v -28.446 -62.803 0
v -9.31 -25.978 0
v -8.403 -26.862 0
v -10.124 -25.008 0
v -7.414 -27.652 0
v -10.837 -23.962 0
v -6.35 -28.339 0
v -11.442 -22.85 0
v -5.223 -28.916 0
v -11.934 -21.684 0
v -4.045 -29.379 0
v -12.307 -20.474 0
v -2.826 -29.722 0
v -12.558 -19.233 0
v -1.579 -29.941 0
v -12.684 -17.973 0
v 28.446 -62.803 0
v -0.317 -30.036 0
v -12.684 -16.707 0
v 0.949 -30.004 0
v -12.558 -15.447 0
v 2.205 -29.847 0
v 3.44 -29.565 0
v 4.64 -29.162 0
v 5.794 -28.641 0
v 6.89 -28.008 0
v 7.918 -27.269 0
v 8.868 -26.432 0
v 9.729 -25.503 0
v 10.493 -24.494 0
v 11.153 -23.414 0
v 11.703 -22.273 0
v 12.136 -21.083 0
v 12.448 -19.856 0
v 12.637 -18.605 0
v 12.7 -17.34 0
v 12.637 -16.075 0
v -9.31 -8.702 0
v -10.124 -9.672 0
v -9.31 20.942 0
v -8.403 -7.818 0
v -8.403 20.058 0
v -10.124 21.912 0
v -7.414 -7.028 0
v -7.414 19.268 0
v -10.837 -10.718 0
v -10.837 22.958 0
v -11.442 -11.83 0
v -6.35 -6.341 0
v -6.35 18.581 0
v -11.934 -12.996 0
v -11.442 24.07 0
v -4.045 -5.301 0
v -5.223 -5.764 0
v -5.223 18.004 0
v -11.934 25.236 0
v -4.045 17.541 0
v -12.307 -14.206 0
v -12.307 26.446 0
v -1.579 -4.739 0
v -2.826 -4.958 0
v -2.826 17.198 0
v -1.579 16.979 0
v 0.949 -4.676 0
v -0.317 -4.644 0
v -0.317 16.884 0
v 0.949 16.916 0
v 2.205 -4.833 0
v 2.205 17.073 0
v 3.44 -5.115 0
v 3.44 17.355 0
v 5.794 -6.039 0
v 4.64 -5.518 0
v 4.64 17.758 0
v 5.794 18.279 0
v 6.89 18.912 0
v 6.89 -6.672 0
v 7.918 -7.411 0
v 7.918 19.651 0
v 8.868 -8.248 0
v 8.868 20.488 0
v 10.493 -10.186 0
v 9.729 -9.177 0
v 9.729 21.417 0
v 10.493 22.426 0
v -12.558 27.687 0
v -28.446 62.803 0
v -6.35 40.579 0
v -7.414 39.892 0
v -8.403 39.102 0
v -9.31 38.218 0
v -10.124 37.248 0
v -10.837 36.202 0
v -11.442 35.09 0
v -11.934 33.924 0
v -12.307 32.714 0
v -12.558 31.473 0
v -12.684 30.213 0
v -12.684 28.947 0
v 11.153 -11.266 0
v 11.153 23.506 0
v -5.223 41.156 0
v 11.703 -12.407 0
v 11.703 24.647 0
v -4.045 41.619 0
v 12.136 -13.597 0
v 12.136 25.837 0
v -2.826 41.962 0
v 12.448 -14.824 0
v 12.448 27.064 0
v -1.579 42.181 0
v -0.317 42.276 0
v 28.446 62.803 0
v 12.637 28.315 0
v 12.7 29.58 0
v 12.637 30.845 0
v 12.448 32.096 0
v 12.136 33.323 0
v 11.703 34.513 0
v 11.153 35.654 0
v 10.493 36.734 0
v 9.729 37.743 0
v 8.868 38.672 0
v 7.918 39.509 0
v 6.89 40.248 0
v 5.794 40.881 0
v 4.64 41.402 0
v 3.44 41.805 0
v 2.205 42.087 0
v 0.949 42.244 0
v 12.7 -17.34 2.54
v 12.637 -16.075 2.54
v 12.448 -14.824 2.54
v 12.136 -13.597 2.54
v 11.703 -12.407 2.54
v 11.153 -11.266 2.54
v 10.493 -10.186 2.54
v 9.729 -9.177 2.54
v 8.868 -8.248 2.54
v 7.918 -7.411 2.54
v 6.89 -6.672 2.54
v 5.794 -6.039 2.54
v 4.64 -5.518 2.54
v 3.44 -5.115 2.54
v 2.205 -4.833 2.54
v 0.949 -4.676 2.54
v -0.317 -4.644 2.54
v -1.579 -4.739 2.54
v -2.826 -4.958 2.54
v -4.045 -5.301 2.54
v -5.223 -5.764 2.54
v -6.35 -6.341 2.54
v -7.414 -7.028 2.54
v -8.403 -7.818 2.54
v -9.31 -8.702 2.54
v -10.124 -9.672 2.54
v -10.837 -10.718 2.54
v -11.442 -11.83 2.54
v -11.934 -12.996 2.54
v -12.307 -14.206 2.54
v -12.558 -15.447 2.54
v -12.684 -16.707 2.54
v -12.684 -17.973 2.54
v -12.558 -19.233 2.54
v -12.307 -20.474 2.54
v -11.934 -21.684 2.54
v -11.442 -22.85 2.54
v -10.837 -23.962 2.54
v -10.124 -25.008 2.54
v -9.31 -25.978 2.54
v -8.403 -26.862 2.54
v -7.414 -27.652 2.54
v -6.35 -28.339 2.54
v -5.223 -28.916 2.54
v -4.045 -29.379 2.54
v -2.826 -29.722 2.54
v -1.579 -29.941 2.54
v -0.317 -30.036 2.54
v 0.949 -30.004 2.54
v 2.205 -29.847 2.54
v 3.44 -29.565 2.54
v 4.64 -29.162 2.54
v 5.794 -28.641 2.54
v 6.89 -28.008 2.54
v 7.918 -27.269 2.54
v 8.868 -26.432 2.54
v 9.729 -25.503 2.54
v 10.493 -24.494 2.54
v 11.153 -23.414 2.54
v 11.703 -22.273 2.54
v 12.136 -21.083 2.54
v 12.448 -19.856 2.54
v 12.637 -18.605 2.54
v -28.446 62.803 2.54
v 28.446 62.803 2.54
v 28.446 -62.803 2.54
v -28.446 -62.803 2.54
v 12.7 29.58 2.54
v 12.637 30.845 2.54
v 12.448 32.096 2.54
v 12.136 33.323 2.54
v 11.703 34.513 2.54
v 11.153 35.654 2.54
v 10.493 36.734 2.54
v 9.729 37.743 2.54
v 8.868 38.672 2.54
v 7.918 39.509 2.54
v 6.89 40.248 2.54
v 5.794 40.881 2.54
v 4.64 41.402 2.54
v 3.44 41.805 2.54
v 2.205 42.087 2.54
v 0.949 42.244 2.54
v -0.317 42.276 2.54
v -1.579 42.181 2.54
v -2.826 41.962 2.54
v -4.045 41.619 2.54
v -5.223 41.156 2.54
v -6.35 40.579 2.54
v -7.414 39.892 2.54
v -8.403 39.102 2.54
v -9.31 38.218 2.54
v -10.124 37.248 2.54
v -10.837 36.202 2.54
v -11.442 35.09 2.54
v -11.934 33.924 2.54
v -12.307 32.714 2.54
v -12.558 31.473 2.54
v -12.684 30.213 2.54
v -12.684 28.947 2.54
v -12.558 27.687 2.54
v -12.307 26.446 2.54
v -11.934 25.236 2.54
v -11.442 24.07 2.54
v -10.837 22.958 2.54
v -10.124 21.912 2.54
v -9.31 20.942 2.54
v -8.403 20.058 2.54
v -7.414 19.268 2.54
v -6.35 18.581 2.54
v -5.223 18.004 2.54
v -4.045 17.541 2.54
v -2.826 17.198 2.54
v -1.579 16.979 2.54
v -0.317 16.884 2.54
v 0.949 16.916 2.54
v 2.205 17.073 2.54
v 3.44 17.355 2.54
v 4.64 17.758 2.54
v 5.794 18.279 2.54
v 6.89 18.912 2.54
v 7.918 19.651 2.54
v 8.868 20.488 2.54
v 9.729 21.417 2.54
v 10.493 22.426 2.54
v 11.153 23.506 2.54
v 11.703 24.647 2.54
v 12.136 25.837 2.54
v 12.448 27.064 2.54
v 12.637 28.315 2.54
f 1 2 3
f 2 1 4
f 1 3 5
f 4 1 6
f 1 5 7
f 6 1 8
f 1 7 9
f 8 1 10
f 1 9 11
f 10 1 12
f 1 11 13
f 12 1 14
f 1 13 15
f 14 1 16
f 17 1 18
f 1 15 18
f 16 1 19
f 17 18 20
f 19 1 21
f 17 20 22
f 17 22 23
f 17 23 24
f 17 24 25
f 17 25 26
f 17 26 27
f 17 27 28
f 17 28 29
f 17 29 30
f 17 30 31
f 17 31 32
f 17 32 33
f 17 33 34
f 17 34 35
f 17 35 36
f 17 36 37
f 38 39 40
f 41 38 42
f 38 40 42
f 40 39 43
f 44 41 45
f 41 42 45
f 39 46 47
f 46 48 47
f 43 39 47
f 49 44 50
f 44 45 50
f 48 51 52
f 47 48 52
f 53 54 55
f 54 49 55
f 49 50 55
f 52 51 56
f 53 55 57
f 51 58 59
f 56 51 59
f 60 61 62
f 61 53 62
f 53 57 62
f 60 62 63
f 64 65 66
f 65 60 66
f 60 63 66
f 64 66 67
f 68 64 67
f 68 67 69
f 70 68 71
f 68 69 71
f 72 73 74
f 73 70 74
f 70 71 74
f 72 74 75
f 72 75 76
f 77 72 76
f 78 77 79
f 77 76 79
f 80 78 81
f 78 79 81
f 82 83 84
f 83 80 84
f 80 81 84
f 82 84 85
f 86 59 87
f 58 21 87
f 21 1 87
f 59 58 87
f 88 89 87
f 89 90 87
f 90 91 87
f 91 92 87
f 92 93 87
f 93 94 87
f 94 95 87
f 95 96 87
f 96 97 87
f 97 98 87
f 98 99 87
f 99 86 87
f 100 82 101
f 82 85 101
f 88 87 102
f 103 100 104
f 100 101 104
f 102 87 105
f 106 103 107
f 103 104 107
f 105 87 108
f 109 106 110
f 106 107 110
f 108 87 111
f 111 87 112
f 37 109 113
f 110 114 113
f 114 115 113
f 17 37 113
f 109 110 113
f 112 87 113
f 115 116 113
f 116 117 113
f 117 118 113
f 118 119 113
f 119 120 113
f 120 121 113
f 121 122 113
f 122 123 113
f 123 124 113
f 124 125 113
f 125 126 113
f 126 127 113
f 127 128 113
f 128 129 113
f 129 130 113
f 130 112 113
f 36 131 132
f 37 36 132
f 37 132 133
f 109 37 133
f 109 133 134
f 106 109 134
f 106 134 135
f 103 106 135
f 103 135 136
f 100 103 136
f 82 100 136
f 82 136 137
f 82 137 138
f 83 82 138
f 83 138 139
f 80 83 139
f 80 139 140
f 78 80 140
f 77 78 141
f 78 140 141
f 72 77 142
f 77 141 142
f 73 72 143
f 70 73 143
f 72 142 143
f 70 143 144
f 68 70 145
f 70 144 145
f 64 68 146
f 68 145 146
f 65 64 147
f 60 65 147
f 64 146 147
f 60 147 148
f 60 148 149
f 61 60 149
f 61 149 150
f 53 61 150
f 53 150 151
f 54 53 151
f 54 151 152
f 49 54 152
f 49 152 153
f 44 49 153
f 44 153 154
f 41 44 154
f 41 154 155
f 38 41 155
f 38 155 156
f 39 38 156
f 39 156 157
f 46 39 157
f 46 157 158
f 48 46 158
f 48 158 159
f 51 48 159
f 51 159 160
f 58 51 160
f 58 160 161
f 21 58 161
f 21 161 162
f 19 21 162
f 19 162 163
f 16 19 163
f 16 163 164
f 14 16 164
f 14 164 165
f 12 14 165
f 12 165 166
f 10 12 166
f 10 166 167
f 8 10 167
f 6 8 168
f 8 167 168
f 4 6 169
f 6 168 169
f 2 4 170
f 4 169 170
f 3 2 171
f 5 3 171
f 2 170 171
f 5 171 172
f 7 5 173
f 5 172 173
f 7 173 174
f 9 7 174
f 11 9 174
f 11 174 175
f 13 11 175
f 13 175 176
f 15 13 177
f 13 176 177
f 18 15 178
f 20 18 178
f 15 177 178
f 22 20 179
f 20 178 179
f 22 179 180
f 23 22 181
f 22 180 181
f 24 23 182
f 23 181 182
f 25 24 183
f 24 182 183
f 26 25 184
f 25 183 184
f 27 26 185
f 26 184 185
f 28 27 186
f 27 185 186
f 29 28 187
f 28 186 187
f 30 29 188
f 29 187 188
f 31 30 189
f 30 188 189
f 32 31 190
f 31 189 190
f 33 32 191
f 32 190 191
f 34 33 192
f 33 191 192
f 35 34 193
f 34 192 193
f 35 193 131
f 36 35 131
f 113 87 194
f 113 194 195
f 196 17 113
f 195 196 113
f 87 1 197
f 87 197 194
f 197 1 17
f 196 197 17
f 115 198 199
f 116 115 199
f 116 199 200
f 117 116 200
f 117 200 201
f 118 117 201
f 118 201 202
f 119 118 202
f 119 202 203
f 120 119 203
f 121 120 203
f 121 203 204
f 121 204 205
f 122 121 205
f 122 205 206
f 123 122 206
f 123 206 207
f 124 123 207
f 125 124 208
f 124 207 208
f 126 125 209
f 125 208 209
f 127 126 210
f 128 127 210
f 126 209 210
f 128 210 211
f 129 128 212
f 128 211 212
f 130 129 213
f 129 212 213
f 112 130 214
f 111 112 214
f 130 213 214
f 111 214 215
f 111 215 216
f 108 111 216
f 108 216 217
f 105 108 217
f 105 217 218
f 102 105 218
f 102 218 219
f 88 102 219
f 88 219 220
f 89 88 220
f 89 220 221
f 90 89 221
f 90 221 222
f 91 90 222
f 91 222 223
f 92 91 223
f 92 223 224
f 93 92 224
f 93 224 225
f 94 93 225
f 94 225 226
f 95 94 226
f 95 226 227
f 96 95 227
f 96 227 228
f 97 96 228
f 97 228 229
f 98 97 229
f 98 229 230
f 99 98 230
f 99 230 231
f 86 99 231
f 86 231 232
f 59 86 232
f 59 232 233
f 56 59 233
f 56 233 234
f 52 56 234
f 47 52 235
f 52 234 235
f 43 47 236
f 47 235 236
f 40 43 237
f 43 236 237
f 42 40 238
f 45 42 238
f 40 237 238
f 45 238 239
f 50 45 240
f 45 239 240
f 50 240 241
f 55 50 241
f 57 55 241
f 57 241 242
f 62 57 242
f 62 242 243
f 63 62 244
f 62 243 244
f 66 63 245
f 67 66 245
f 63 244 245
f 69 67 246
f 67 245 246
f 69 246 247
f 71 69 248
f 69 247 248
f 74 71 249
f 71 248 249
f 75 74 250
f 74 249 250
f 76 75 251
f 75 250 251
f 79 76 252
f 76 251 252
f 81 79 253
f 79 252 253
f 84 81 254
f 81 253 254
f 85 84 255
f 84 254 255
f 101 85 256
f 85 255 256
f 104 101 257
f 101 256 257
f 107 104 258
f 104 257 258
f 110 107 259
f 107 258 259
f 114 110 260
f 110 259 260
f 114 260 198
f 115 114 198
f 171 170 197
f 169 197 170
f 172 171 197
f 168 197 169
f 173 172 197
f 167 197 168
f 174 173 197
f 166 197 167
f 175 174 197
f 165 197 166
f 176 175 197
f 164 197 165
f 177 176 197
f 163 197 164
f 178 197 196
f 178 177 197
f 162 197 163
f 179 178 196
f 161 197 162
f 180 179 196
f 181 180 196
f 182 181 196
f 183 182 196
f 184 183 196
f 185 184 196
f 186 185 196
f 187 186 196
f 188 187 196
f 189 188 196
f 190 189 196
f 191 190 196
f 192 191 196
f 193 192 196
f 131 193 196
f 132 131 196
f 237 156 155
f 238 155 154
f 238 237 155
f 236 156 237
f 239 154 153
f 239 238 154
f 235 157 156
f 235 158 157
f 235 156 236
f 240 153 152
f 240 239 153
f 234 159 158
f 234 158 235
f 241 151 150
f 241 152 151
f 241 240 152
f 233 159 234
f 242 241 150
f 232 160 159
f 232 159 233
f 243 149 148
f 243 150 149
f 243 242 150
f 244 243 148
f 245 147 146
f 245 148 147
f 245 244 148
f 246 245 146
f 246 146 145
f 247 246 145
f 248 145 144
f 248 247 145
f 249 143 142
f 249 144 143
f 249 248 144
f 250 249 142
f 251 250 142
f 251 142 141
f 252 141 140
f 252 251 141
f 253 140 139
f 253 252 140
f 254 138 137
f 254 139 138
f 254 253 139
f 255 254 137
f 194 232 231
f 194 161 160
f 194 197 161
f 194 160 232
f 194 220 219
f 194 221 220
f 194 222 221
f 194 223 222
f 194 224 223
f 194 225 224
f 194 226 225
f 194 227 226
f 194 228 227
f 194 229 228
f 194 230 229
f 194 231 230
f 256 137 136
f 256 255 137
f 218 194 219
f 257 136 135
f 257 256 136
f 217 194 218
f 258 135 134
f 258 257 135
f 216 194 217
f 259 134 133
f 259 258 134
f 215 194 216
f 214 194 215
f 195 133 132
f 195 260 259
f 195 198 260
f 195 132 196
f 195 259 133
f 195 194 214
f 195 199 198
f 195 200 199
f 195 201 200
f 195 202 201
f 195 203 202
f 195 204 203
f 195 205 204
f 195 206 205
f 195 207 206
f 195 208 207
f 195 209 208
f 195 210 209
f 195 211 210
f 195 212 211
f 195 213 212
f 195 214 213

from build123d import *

# Parameters (mm, degrees)
SKETCH1_W           = 56.891165124
SKETCH1_H           = 125.605714286
BOSS_EXTRUDE1_DEPTH = 2.54
CUT_EXTRUDE1_REACH  = 4.54
SKETCH2_R           = 12.7


with BuildPart() as part:
    # Sketch1 → Boss-Extrude1 (new body)
    with BuildSketch(Plane.XY):
        Rectangle(SKETCH1_W, SKETCH1_H)
    extrude(amount=BOSS_EXTRUDE1_DEPTH)

    # Sketch2 → Cut-Extrude1 (cut, up to next)
    with BuildSketch(Plane.XY.offset(2.54), mode=Mode.PRIVATE) as cut_extrude1_sk1:
        with Locations((0, 29.58)):
            Circle(SKETCH2_R)
    cut_extrude1_tool1 = extrude(cut_extrude1_sk1.sketch, amount=-CUT_EXTRUDE1_REACH, mode=Mode.PRIVATE) & part.part
    add(cut_extrude1_tool1.solids().sort_by_distance((0, 29.58, 2.54))[0], mode=Mode.SUBTRACT)
    # Sketch2 → Cut-Extrude1 (cut, up to next)
    with BuildSketch(Plane.XY.offset(2.54), mode=Mode.PRIVATE) as cut_extrude1_sk2:
        with Locations((0, -17.34)):
            Circle(SKETCH2_R)
    cut_extrude1_tool2 = extrude(cut_extrude1_sk2.sketch, amount=-CUT_EXTRUDE1_REACH, mode=Mode.PRIVATE) & part.part
    add(cut_extrude1_tool2.solids().sort_by_distance((0, -17.34, 2.54))[0], mode=Mode.SUBTRACT)


solid = part.part
